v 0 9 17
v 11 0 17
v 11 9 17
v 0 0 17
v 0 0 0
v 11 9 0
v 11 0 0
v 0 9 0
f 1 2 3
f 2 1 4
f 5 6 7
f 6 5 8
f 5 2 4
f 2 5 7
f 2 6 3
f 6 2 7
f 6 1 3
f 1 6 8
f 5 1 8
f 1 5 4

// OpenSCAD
// Generated by SolidPython 1.0.1 on 2020-07-29 00:46:55


cube(size = [11, 9, 17]);
/***********************************************
*********      SolidPython code:      **********
************************************************
 
# import packages: SolidPython
from solid import *
from solid.utils import *
from itertools import chain, combinations, permutations


class Resize:

    def __init__(self, scad_file):
        self.scad_file = scad_file
        #self.scad_file = import_scad(scad_file)
        # cone/cylinder param:
        self.r1 = 0
        self.r2 = 0
        self.h = 0
        # rectangular prism param:
        self.w = 0
        self.l = 0
        # ellipse param:
        self.r = 0

    # import OpenScad code (file name corresponds to shape)


    # classify shape + parameters
    def assign(self, param1, param2, param3):
        if self.scad_file == 'cone.scad':
            self.r1 = param1
            self.r2 = param2
            self.h = param3
        elif self.scad_file == 'cylinder.scad':
            self.r1 = param1
            self.r2 = param2
            self.h = param3
        elif self.scad_file == 'rectangularPrism.scad':
            self.h = param1
            self.l = param2
            self.w = param3
        else:
            self.r = param1
            self.h = param2

    # resize parameters
    def iterate(self):
        x = range(3, 20, 2)
        i = 1
        if self.scad_file == 'cone.scad':
            tempList = list(permutations(x, 2))
            for temp in tempList:
                param1 = temp[0]
                param2 = temp[1]
                filepath = 'produced_scad_files/' + 'cone' + str(param1) + '_' + str(param2) + '_' + '.scad'
                scad_render_to_file(cylinder(h=param1, r1=param2, r2=0), filepath)

        elif self.scad_file == 'cylinder.scad':
            tempList = list(permutations(x, 3))
            for temp in tempList:
                param1 = temp[0]
                param2 = temp[1]
                filepath = 'produced_scad_files/' + 'cylinder' + str(param1) + '_' + str(param2) + '_' + '.scad'
                scad_render_to_file(cylinder(h=param1, r1=param2, r2=param2), filepath)

        elif self.scad_file == 'rectangularPrism.scad':
            tempList = list(permutations(x, 3))
            for temp in tempList:
                param1 = temp[0]
                param2 = temp[1]
                param3 = temp[2]
                filepath = 'produced_scad_files/' + 'rectangularPrism' + str(param1) + '_' + str(param2) + '_' + str(
                    param3) + '.scad'
                scad_render_to_file(cube(size=(param1, param2, param3)), filepath)

        elif self.scad_file == 'ellipse.scad':
            tempList = list(permutations(x, 4))
            for temp in tempList:
                param1 = temp[0]
                param2 = temp[1]
                param3 = temp[2]
                param4 = temp[3]
                filepath = 'produced_scad_files/' + 'ellipse' + str(param1) + '_' + str(param2) + '_' + str(param3) + '_' + str(param4) + '.scad'
                scad_render_to_file(scale([param1, param2, param3])(sphere(r=param4)), filepath)

    def render_to_scadfile(self):
        scad_render_to_file(scad, 'example.scad') 
 
************************************************/
